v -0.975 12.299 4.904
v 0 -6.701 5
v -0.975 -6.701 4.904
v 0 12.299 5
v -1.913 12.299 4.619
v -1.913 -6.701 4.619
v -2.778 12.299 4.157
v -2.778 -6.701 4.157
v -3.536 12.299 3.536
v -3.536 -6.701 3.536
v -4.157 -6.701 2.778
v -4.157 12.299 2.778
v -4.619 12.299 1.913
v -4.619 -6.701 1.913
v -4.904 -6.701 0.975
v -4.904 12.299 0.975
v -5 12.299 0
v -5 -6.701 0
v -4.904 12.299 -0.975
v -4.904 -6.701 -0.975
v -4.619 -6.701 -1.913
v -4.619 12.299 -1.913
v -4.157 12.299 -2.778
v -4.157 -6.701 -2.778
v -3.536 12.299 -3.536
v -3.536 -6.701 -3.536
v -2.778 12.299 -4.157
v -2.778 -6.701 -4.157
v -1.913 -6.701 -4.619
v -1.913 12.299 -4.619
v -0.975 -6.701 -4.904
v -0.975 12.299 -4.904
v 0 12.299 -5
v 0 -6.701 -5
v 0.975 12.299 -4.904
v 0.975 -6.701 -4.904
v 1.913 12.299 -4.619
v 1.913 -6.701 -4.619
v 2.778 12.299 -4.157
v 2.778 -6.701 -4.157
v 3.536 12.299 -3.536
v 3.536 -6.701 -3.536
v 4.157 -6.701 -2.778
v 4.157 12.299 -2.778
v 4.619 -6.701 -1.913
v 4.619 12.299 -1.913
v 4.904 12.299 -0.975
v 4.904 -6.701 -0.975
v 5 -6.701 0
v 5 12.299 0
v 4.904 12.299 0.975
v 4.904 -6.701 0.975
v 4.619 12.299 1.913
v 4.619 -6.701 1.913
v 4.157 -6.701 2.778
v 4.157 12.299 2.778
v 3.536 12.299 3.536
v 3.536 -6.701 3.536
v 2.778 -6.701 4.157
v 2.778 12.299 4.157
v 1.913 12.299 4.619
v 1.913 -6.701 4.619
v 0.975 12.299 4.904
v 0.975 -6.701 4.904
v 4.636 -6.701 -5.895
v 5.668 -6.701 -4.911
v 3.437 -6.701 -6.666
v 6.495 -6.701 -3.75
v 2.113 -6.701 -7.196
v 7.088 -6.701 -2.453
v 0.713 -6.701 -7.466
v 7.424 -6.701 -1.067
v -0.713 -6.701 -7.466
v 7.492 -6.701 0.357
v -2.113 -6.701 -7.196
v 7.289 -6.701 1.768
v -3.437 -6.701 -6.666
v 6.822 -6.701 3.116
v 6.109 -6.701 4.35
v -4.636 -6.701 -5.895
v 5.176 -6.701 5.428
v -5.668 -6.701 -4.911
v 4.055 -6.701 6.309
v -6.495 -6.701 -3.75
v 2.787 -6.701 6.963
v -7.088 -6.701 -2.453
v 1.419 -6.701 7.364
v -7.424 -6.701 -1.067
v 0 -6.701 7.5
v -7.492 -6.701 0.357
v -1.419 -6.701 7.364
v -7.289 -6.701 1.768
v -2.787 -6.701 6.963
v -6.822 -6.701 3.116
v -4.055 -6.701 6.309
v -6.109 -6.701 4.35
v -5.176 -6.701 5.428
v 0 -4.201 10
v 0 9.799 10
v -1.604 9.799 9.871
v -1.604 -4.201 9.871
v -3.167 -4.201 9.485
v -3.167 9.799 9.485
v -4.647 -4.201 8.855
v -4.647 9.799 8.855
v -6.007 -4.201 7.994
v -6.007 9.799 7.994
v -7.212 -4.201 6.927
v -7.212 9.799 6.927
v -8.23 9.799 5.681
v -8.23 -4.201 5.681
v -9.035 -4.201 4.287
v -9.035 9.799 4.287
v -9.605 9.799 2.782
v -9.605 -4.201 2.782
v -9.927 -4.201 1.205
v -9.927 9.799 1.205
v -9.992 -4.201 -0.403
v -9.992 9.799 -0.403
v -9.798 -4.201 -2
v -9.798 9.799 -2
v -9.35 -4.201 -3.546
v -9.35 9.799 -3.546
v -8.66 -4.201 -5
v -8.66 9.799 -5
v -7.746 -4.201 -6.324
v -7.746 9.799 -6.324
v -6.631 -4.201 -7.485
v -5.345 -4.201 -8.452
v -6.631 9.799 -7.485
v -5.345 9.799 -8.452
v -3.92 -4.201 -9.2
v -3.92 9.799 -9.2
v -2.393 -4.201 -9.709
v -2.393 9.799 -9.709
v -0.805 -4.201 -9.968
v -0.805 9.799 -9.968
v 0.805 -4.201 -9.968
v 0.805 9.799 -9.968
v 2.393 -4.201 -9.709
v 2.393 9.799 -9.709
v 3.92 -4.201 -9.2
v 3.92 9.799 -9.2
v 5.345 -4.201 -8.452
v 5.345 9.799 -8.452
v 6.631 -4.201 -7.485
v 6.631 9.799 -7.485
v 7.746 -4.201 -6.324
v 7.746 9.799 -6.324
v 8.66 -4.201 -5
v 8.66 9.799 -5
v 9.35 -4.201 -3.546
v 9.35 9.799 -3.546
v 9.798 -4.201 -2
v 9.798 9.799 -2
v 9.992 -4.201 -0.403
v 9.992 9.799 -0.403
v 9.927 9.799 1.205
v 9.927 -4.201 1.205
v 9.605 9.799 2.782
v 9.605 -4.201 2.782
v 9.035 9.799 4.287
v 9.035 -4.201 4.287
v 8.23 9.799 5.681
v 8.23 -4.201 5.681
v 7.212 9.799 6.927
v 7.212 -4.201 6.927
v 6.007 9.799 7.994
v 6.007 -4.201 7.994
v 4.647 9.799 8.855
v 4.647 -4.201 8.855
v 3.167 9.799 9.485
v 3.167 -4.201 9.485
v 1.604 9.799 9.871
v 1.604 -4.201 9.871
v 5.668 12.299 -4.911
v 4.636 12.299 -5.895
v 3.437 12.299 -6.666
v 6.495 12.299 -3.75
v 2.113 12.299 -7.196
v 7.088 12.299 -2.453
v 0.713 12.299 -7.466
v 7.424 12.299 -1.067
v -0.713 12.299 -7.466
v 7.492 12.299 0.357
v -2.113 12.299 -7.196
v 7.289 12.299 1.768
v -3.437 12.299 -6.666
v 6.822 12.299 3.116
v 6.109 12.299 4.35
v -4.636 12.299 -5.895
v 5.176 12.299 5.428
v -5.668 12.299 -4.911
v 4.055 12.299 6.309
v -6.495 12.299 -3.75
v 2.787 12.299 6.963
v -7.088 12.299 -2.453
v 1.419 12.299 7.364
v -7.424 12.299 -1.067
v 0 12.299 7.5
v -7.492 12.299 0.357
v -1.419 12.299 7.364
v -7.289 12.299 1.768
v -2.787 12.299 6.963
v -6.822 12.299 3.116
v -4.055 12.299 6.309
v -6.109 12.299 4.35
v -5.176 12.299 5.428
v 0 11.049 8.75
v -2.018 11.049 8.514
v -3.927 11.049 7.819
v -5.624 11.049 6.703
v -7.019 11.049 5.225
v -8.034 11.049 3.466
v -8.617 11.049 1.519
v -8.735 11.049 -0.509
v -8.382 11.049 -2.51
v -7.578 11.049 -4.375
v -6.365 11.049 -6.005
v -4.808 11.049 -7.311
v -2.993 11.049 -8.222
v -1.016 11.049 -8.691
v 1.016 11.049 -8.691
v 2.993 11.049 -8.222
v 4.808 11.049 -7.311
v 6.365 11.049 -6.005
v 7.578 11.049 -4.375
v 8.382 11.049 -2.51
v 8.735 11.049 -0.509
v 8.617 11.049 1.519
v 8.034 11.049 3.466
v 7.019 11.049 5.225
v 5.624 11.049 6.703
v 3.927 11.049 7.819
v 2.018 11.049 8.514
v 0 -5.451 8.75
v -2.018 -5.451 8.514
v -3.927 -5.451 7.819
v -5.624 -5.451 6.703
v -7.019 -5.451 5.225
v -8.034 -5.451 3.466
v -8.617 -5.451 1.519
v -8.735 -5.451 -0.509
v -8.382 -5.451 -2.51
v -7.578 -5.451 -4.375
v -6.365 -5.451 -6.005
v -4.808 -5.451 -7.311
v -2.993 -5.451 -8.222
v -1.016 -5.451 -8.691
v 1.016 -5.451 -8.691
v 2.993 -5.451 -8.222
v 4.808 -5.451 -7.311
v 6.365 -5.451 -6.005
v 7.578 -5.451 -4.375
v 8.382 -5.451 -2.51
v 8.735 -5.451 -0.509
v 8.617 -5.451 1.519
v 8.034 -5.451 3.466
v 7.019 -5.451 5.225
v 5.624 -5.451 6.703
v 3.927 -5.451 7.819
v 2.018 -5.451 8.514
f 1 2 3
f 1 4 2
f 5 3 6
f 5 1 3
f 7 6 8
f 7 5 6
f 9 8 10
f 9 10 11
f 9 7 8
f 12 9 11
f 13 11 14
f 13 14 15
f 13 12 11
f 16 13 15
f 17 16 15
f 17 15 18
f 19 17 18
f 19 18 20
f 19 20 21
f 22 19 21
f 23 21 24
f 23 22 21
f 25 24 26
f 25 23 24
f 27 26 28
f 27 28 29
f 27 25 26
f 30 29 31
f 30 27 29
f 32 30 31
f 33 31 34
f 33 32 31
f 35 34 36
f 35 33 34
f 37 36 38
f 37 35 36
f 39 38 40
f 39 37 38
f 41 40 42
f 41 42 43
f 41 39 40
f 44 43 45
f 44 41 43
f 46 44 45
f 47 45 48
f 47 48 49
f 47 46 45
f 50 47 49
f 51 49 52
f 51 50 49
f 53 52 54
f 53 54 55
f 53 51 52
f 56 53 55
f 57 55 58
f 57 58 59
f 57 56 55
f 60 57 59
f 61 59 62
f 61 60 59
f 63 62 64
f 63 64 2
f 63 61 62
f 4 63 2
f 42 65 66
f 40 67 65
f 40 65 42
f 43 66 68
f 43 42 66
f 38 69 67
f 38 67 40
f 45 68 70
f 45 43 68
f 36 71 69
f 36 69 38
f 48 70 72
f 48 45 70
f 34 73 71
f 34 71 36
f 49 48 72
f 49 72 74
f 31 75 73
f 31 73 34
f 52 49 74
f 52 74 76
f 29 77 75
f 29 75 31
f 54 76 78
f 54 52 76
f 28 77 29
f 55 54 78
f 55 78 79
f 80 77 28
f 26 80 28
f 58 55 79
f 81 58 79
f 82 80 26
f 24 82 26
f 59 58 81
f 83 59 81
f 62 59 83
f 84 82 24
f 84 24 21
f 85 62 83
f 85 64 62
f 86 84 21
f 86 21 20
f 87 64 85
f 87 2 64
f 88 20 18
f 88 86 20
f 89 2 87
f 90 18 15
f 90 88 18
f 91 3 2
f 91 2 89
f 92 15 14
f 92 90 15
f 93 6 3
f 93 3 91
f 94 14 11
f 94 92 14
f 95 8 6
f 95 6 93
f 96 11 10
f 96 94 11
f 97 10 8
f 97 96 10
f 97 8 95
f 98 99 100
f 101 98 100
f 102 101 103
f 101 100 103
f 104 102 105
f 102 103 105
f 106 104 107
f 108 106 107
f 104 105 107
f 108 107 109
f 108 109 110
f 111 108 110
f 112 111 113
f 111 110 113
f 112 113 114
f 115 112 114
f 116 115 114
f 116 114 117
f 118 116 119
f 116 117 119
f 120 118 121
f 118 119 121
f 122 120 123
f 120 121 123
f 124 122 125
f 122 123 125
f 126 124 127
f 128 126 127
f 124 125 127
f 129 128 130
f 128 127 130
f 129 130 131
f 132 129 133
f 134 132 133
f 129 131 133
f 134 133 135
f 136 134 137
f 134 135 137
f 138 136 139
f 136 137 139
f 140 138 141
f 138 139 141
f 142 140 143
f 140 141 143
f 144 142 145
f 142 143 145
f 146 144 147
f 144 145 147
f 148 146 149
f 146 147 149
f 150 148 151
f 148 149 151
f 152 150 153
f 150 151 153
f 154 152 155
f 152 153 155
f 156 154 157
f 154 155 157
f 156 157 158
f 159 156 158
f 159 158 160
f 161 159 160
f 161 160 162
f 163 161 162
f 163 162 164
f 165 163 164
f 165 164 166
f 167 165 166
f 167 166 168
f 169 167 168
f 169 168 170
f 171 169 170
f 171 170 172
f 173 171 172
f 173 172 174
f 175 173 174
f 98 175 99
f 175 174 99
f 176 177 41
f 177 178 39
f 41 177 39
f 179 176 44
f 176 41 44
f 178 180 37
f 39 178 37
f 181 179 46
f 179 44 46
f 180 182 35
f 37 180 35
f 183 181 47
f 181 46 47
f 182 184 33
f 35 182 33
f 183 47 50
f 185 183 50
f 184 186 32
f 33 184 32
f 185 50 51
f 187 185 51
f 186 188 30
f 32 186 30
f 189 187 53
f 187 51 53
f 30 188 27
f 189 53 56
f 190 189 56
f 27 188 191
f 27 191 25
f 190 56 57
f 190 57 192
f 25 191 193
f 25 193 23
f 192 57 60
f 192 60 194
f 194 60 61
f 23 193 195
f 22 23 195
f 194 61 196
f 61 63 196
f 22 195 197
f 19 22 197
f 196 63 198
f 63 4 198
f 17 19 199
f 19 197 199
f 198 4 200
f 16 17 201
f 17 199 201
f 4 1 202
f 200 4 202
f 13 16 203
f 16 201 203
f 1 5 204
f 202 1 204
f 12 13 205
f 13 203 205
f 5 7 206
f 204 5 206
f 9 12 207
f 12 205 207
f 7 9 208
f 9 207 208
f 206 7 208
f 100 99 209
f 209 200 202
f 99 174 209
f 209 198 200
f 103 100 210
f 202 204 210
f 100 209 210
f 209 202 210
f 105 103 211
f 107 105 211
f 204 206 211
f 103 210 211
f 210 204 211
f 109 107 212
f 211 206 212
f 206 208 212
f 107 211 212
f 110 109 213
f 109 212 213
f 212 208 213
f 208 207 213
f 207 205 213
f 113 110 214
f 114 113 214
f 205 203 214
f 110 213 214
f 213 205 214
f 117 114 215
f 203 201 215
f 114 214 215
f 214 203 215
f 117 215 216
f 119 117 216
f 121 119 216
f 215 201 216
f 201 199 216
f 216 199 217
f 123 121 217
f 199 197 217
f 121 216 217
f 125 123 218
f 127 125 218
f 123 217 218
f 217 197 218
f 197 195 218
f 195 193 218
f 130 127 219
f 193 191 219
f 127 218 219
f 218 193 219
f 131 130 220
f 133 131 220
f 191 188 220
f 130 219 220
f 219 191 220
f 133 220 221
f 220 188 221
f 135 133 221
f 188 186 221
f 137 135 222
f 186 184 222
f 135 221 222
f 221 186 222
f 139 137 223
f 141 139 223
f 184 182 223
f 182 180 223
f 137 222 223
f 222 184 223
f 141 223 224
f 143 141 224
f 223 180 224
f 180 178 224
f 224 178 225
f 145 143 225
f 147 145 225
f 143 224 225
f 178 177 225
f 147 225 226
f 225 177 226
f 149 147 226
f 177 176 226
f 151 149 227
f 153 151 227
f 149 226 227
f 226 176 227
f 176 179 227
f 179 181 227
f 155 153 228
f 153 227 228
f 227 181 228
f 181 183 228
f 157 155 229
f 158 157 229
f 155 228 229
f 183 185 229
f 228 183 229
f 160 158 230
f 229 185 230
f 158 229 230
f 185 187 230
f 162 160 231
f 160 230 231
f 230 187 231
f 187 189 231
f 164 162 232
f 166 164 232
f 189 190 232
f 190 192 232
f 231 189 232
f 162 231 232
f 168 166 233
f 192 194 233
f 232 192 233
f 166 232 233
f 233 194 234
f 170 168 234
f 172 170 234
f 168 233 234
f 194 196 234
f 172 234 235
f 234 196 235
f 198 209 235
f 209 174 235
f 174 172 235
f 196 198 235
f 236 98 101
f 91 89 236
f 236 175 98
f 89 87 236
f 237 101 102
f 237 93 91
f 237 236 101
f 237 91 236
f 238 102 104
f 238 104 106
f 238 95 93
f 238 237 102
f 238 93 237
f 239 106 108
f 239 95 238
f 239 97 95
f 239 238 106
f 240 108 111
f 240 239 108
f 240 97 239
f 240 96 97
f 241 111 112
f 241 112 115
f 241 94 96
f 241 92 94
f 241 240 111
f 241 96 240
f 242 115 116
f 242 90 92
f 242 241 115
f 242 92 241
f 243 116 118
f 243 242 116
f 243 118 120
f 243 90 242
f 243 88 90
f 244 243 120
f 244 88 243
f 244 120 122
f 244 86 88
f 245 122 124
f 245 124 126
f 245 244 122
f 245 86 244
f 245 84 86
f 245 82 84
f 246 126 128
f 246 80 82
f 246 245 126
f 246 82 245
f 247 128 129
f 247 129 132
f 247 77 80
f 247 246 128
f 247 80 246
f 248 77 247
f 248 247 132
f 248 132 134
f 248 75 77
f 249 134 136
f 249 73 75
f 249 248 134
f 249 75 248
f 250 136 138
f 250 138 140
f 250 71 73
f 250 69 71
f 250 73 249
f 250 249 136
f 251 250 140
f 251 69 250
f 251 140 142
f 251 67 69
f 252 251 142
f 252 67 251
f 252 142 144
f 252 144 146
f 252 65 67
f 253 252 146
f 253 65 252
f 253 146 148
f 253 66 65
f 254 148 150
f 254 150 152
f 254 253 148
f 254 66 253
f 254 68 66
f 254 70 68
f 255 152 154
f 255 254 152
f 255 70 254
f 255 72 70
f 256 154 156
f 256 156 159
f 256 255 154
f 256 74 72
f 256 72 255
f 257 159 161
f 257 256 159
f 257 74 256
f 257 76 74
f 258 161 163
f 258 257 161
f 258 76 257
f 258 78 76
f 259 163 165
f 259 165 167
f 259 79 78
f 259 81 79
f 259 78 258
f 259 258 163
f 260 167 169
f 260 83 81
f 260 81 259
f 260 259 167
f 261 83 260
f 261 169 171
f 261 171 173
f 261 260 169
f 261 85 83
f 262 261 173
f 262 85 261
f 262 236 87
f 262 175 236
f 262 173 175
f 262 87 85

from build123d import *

# Parameters (mm, degrees)
SKETCH1_W     = 5
SKETCH1_H     = 19
CHAMFER1_SIZE = 2.5
CHAMFER2_SIZE = 2.5


with BuildPart() as part:
    # Sketch1 → Revolve1 (revolve)
    with BuildSketch(Plane.XY, mode=Mode.PRIVATE) as revolve1_sk:
        with Locations((-7.5, 2.799270073)):
            Rectangle(SKETCH1_W, SKETCH1_H)
    revolve(revolve1_sk.sketch.rotate(Axis((0, 14.390243325, 0), (0, -1, 0)), 270), axis=Axis((0, 14.390243325, 0), (0, -1, 0)))

    # Chamfer1
    chamfer1_edges = [part.edges().sort_by_distance(p)[0] for p in [
        (0, 12.299270073, -10),
    ]]
    chamfer(chamfer1_edges, length=CHAMFER1_SIZE)

    # Chamfer2
    chamfer2_edges = [part.edges().sort_by_distance(p)[0] for p in [
        (0, -6.700729927, -10),
    ]]
    chamfer(chamfer2_edges, length=CHAMFER2_SIZE)


solid = part.part
